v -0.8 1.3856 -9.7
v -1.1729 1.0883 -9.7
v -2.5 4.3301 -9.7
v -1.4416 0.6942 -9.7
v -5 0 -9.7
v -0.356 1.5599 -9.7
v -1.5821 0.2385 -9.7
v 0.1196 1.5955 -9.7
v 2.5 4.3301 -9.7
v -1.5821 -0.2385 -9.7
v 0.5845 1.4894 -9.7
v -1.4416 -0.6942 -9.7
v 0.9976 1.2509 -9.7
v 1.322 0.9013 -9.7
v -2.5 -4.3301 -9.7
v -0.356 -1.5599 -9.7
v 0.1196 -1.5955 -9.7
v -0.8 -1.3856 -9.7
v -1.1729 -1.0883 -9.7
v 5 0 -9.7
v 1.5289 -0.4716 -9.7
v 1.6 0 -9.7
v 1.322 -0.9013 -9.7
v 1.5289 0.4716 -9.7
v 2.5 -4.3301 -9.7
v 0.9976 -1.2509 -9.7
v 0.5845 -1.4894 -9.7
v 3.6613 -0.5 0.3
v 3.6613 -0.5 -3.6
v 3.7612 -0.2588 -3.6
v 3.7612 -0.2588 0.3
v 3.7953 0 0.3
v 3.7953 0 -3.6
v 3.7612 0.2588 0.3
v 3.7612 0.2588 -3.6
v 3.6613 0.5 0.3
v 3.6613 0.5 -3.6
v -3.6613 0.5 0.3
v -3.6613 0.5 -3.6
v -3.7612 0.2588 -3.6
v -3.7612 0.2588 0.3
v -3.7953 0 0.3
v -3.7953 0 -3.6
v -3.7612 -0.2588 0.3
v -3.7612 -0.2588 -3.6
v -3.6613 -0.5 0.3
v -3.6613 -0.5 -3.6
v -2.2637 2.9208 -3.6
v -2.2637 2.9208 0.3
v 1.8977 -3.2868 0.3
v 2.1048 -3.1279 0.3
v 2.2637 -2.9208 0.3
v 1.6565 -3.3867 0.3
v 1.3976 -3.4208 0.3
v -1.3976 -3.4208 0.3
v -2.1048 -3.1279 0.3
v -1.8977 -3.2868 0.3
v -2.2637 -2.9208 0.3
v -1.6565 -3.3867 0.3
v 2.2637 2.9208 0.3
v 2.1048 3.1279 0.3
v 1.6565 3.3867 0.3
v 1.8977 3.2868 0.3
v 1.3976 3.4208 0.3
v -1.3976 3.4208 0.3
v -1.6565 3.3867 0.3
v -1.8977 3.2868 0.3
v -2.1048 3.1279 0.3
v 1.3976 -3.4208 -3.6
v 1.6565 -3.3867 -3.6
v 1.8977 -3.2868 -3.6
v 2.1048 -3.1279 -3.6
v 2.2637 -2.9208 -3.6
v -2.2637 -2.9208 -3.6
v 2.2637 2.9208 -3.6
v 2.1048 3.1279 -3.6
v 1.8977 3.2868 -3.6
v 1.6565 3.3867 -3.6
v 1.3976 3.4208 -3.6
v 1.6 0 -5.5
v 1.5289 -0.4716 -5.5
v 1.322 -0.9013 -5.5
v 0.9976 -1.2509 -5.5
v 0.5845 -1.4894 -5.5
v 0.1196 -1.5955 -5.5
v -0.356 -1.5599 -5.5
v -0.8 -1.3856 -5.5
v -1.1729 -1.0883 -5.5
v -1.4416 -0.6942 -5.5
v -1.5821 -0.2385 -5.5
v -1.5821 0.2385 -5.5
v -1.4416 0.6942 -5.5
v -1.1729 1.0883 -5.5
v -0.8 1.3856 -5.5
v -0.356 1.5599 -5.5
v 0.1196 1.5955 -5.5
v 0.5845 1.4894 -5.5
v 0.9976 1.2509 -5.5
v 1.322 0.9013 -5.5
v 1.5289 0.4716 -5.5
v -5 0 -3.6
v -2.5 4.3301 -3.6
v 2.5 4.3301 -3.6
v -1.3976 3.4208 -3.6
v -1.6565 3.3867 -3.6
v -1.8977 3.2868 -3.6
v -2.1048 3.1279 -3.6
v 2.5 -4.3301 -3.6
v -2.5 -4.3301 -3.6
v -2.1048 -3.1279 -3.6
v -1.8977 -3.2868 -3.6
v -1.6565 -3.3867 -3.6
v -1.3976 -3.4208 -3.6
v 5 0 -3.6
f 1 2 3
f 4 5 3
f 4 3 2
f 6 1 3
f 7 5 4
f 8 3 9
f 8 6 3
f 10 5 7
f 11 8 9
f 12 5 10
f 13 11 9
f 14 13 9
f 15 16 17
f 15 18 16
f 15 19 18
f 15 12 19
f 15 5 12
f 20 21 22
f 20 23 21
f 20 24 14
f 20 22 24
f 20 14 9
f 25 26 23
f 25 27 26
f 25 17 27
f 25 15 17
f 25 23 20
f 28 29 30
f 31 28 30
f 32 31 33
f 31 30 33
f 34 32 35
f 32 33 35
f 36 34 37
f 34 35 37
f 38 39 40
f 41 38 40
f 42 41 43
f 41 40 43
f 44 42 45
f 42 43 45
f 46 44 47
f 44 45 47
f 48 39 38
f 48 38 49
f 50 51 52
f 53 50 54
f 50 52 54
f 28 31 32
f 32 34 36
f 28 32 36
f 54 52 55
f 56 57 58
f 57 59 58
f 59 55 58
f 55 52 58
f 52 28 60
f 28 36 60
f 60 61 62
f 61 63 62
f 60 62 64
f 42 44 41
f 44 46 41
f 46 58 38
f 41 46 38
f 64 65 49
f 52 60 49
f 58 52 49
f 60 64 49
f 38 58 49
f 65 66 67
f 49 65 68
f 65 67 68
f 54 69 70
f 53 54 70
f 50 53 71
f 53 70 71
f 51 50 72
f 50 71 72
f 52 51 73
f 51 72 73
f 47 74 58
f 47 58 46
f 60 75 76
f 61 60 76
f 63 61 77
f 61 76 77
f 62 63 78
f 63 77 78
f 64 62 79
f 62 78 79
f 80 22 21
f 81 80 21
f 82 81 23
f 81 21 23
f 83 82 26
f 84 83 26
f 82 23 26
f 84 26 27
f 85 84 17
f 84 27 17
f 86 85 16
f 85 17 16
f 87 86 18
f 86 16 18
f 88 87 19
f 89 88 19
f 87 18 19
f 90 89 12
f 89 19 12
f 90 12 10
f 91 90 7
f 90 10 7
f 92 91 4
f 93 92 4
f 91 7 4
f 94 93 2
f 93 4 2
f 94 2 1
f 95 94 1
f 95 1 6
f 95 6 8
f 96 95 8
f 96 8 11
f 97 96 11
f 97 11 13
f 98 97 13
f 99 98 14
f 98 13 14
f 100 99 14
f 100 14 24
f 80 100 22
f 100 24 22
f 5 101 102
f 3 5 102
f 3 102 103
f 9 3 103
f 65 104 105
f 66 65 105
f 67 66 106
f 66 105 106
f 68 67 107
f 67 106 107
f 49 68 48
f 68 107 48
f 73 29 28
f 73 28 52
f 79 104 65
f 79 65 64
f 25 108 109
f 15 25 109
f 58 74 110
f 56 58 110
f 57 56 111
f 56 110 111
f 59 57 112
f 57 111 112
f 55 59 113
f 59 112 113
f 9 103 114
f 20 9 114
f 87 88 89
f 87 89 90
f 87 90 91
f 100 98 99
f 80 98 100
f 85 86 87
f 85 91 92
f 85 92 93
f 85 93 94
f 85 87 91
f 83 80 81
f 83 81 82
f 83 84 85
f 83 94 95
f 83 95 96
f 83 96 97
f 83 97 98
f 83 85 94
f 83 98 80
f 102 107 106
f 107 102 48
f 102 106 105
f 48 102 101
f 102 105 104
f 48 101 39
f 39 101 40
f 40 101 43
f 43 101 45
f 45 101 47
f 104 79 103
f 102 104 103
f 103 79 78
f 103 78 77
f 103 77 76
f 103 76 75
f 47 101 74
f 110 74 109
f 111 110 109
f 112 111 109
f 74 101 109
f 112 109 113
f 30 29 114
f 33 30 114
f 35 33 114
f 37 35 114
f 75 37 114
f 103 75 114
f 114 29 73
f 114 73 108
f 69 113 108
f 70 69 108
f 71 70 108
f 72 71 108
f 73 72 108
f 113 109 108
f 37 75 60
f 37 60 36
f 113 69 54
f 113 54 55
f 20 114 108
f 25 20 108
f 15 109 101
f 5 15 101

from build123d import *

# Parameters (mm, degrees)
PAD_DEPTH    = 3.9
PAD001_DEPTH = 6.1
SKETCH002_R  = 1.6
POCKET_DEPTH = 4.2


with BuildPart() as part:
    # Sketch → Pad (new body)
    with BuildSketch(Plane.XY):
        with BuildLine():
            Line((-3.66133, 0.49999), (-2.263681, 2.920791))
            ThreePointArc((-1.39765, 3.4208), (-1.897655, 3.286823), (-2.263681, 2.920791))
            Line((-1.39765, 3.4208), (1.39765, 3.4208))
            ThreePointArc((2.263681, 2.920791), (1.897655, 3.286823), (1.39765, 3.4208))
            Line((2.263681, 2.920791), (3.66133, 0.49999))
            ThreePointArc((3.66133, -0.49999), (3.795299, 0), (3.66133, 0.49999))
            Line((3.66133, -0.49999), (2.263681, -2.920791))
            ThreePointArc((1.39765, -3.4208), (1.897655, -3.286823), (2.263681, -2.920791))
            Line((1.39765, -3.4208), (-1.397649, -3.4208))
            ThreePointArc((-2.263681, -2.920791), (-1.897654, -3.286823), (-1.397649, -3.4208))
            Line((-2.263681, -2.920791), (-3.66133, -0.49999))
            ThreePointArc((-3.66133, 0.49999), (-3.795299, 0), (-3.66133, -0.49999))
        make_face()
    extrude(amount=PAD_DEPTH)

    # Sketch001 (on DatumPlane) → Pad001 (join)
    with BuildSketch(Plane(origin=(0, 0, 0), x_dir=(1, 0, 0), z_dir=(0, 0, -1))):
        Polygon((5, 0), (2.5, 4.330127), (-2.5, 4.330127), (-5, 0), (-2.5, -4.330127), (2.5, -4.330127), align=None)
    extrude(amount=PAD001_DEPTH)

    # Sketch002 (on DatumPlane) → Pocket (cut)
    with BuildSketch(Plane(origin=(0, 0, -6.1), x_dir=(1, 0, 0), z_dir=(0, 0, -1))):
        Circle(SKETCH002_R)
    extrude(amount=-POCKET_DEPTH, mode=Mode.SUBTRACT)


with BuildPart() as part_1:
    # Body placement: moved
    add(part.part.moved(Location((0, 0, -3.6))))


solid = part_1.part
